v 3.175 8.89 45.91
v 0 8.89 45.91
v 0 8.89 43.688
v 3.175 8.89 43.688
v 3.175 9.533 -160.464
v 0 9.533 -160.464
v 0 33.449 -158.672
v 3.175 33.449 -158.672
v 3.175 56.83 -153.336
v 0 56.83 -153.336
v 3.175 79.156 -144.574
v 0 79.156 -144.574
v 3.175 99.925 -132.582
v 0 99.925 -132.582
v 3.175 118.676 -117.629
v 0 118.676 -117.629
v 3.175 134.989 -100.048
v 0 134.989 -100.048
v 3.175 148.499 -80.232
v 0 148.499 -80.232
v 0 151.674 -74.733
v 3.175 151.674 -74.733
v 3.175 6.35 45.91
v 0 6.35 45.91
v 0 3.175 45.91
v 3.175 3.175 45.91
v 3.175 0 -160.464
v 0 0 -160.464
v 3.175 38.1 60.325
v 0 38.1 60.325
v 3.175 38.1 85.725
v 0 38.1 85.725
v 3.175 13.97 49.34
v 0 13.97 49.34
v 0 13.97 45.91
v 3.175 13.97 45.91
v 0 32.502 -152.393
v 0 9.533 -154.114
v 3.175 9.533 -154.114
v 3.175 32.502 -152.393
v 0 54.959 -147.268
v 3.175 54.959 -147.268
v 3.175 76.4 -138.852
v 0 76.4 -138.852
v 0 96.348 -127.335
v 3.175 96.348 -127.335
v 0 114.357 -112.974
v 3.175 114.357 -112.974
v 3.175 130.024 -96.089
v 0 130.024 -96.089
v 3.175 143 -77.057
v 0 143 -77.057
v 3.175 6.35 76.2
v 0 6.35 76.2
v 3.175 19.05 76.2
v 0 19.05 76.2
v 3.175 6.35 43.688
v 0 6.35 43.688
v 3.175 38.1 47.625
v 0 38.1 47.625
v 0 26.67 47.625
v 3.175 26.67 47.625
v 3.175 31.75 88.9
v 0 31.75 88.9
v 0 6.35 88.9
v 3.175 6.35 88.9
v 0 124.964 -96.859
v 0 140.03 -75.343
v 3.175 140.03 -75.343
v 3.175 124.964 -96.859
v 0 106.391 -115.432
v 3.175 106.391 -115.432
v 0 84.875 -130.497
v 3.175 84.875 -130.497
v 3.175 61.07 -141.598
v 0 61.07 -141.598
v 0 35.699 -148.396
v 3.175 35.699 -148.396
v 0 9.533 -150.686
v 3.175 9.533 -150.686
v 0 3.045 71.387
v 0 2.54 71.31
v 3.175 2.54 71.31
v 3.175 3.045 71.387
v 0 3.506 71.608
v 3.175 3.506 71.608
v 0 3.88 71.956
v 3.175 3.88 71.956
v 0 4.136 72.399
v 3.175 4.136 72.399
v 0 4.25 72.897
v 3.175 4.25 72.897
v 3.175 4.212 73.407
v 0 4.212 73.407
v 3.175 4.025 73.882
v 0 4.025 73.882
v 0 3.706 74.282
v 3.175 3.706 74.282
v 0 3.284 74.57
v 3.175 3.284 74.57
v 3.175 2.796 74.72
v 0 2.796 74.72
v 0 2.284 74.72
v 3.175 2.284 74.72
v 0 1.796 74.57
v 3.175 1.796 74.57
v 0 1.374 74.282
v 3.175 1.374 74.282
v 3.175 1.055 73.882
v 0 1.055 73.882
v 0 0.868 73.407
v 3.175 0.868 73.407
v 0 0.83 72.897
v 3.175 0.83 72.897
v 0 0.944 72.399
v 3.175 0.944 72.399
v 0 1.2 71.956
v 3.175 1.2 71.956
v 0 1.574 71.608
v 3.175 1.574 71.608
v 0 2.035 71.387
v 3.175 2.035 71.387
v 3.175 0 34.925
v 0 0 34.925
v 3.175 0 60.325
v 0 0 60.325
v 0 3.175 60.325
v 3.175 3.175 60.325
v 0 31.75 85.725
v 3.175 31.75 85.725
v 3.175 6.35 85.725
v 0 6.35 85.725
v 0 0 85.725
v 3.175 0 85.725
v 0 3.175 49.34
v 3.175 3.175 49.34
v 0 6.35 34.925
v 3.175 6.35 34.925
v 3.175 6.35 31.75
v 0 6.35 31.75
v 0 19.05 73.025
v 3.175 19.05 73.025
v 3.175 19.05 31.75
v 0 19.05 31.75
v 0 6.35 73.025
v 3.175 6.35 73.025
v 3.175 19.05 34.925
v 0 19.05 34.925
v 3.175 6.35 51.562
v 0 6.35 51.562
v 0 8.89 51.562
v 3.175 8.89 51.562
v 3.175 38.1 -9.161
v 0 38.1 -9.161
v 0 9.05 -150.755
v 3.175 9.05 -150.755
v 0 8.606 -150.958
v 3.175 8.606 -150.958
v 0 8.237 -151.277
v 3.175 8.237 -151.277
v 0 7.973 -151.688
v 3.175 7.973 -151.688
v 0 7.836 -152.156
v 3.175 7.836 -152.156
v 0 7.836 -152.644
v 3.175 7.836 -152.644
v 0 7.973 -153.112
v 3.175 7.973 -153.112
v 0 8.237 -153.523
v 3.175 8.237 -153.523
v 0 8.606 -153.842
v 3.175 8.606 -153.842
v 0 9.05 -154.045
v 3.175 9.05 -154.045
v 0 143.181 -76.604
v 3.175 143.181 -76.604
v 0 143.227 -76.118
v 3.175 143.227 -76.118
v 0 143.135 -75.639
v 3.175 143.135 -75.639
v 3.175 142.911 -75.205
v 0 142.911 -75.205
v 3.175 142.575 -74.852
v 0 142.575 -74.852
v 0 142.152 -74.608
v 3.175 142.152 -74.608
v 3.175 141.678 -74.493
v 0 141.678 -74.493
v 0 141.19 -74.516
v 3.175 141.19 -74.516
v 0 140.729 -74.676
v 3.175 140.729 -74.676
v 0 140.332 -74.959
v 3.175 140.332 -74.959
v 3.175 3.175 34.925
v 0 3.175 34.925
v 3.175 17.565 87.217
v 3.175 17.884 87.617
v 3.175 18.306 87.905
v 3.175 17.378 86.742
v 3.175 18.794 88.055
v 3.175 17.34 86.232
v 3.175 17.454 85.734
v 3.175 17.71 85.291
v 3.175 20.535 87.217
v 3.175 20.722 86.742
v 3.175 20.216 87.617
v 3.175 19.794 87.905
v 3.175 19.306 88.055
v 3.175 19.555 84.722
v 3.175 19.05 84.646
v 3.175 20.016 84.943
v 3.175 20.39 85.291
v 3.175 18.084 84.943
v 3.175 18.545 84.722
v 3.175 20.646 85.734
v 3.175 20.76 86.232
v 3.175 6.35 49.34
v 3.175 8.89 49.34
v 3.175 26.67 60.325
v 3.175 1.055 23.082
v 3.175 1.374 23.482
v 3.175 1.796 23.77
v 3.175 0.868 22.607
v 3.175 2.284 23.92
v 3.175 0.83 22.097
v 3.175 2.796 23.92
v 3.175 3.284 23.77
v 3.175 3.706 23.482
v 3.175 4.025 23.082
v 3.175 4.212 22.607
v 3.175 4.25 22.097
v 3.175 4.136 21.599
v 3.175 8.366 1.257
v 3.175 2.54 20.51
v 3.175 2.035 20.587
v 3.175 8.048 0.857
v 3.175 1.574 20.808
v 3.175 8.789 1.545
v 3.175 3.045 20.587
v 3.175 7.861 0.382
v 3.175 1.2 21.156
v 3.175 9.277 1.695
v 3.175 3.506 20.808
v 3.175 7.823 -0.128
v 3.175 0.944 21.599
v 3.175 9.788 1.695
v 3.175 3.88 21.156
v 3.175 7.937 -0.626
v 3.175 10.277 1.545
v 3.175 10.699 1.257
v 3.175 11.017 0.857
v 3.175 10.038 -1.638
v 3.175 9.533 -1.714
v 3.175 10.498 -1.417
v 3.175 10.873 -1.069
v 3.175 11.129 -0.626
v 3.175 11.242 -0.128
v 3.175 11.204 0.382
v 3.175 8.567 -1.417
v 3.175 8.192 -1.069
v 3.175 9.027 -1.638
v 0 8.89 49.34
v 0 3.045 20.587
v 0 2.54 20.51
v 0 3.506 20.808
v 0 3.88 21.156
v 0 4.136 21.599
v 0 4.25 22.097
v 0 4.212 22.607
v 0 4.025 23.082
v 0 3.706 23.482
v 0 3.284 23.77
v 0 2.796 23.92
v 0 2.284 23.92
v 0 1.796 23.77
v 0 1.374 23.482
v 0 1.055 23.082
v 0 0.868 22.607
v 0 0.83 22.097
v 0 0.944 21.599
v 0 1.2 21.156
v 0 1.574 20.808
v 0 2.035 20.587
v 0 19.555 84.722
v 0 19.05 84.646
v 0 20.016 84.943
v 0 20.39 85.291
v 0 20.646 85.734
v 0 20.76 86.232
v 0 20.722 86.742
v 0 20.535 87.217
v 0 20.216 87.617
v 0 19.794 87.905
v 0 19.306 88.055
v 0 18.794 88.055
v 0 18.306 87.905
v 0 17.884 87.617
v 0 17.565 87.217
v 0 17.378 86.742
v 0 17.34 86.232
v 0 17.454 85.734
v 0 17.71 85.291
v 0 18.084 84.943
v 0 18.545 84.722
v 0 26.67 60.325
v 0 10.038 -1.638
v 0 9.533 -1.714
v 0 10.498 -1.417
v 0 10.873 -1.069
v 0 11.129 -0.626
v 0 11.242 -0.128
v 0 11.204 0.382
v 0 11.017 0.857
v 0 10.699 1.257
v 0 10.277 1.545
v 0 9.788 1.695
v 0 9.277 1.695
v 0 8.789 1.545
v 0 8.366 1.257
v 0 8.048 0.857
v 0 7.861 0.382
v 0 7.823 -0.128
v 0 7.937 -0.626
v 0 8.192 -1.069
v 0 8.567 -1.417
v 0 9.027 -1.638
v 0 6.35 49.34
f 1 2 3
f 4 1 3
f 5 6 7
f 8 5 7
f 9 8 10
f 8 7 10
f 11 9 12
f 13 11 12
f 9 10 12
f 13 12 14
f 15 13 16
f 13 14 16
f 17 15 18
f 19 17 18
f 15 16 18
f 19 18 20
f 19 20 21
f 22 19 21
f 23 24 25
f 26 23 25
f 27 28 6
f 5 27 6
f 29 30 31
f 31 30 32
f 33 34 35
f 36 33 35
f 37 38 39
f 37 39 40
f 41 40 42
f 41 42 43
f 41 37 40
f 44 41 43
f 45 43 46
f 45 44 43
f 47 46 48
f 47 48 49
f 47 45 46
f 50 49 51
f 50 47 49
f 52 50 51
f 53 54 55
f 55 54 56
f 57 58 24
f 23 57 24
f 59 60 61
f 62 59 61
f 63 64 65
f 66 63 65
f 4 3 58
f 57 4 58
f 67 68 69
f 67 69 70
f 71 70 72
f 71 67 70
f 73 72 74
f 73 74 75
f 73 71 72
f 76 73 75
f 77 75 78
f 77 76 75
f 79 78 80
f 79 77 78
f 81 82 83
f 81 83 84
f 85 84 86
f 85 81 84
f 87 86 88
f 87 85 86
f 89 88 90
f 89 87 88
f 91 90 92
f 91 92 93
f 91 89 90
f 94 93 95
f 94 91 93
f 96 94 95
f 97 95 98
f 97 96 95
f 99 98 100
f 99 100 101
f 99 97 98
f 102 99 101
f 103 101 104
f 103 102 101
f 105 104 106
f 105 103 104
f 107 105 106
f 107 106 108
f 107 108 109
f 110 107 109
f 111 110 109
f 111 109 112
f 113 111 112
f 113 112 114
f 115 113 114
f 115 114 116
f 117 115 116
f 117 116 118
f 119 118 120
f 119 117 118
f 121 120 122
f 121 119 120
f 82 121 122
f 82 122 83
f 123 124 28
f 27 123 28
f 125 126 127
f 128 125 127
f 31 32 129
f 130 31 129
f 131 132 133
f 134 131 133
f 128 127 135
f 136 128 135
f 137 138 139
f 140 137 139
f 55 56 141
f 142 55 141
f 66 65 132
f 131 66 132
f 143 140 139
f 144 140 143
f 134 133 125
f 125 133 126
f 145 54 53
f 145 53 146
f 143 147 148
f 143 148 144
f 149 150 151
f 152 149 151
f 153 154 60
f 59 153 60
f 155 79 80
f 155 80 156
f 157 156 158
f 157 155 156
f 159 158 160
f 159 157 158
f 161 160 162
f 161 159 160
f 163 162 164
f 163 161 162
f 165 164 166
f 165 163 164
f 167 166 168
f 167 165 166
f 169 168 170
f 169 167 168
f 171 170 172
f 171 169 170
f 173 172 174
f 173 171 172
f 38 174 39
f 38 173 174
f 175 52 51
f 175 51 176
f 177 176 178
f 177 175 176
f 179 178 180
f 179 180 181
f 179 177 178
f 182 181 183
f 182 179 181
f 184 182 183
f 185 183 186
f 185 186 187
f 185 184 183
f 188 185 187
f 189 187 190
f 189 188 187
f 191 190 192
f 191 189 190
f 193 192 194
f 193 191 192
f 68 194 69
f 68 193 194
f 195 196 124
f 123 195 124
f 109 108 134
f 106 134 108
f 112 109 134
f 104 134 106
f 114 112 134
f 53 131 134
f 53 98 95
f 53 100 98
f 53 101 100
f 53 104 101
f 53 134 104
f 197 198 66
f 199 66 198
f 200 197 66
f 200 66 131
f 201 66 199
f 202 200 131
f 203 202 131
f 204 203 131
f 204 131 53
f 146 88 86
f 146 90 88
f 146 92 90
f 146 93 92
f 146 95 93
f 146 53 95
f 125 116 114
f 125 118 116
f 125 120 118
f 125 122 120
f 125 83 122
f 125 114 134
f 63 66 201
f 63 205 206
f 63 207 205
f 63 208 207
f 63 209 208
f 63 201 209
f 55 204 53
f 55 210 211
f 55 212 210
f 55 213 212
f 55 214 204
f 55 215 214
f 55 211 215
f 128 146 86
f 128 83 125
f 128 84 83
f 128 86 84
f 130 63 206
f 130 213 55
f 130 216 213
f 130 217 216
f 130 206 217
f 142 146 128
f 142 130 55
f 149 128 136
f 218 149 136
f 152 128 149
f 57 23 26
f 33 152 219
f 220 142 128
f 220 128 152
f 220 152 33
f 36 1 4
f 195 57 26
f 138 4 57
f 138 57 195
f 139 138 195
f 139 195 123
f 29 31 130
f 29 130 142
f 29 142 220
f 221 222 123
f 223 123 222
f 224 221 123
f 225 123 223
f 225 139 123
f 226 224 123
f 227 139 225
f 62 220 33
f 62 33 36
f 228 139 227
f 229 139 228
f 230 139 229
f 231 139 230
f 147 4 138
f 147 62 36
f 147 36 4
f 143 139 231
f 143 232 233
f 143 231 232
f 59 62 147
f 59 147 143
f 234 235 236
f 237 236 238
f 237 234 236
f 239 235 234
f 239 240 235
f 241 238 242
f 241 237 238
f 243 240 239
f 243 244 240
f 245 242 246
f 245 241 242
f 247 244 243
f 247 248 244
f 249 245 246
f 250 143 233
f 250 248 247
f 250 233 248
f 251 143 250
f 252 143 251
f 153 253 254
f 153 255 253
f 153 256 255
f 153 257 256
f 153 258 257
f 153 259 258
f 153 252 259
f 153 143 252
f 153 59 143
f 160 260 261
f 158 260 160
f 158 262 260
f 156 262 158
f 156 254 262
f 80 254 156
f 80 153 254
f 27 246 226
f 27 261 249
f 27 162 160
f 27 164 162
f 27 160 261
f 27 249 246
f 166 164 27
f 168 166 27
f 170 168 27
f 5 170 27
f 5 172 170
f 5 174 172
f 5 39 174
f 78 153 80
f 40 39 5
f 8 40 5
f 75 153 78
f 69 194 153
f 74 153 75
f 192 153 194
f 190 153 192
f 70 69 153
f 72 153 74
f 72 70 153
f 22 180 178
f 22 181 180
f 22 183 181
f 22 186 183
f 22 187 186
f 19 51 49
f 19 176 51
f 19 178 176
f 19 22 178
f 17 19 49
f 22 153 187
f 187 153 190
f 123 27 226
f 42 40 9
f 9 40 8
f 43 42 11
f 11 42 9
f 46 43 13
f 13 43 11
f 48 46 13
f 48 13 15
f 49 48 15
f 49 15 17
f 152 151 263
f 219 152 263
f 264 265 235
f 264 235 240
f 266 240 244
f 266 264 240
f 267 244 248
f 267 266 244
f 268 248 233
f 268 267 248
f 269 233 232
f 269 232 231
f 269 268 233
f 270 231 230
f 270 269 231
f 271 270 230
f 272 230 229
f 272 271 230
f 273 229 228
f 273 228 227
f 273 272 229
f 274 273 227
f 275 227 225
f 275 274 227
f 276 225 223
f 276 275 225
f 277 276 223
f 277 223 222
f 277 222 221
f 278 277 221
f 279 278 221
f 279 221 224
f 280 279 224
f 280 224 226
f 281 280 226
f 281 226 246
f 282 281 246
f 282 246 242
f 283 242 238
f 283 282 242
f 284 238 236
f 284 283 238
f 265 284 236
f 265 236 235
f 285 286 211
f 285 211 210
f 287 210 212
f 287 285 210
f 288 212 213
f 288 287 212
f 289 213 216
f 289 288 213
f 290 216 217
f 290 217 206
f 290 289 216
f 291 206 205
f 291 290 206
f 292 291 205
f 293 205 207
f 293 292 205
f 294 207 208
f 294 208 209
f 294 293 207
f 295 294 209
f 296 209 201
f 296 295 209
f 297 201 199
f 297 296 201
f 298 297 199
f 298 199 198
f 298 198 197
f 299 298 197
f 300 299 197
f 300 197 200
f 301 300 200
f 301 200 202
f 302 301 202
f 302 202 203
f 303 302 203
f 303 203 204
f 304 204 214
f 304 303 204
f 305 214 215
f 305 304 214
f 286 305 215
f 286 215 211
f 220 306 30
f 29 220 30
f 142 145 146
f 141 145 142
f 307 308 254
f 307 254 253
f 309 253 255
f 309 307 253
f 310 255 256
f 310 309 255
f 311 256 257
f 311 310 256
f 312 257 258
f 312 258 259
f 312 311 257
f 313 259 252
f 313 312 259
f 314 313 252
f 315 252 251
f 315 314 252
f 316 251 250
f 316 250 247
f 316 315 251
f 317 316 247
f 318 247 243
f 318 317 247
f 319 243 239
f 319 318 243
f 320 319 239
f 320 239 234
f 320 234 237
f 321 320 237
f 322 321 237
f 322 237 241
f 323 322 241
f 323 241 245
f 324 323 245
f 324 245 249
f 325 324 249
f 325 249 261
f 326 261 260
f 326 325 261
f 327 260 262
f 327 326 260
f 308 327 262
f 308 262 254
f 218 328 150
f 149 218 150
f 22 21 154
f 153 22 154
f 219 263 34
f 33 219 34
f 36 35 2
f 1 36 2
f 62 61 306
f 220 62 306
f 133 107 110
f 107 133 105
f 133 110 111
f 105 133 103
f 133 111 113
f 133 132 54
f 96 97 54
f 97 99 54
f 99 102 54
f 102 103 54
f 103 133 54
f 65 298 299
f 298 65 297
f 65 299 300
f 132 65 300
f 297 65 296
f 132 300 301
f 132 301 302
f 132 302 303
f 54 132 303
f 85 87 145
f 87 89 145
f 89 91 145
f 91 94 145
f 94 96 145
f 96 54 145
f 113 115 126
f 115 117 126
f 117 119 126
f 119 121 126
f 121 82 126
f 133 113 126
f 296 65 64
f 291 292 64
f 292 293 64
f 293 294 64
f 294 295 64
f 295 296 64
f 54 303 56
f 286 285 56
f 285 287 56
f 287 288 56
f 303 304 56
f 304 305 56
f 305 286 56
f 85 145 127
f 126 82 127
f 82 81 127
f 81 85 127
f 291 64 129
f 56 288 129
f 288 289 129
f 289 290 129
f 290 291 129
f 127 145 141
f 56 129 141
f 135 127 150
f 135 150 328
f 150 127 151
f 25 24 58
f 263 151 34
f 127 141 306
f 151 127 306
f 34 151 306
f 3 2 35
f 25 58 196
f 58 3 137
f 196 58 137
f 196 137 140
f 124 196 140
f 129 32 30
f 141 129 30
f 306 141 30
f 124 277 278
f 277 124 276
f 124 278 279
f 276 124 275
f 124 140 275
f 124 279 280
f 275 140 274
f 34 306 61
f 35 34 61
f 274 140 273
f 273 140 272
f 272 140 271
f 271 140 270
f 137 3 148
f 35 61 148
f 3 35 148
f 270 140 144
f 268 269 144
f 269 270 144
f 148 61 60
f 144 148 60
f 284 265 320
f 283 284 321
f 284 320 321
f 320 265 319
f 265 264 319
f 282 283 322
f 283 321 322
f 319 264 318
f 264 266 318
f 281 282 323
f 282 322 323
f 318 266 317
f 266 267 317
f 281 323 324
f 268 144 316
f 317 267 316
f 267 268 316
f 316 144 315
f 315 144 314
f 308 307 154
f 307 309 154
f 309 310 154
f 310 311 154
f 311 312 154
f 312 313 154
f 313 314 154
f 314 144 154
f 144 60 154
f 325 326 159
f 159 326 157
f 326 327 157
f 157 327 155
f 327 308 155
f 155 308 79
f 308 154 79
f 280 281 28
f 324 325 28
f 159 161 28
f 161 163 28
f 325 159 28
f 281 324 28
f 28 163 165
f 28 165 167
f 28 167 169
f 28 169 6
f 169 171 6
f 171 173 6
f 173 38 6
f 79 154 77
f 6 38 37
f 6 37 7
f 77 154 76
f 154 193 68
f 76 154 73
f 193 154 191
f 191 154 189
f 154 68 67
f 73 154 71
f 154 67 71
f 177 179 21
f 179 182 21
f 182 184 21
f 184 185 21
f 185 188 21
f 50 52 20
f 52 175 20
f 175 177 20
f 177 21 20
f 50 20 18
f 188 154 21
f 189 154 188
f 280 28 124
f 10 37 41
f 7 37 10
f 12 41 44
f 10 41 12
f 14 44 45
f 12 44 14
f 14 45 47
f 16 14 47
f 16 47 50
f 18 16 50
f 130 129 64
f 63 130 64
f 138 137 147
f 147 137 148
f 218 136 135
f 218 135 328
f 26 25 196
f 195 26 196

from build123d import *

# Parameters (mm, degrees)
SKETCH1_R           = 1.7145
SKETCH1_W           = 3.175
SKETCH1_H           = 12.7
BOSS_EXTRUDE2_DEPTH = 3.175


with BuildPart() as part:
    # Sketch1 → Boss-Extrude2 (new body)
    with BuildSketch(Plane(origin=(0, 0, 0), x_dir=(0, 0, -1), z_dir=(1, 0, 0))):
        with BuildLine():
            Line((0, 0), (160.4645, 0))
            Line((160.4645, 0), (160.4645, 9.53262))
            ThreePointArc((160.4645, 9.53262), (138.966333406, 89.76487), (80.23225, 148.498953406))
            Line((80.23225, 148.498953406), (74.732988686, 151.673953406))
            Line((74.732988686, 151.673953406), (9.161036114, 38.1))
            Line((9.161036114, 38.1), (-47.625, 38.1))
            Line((-47.625, 38.1), (-47.625, 26.67))
            Line((-47.625, 26.67), (-60.325, 26.67))
            Line((-60.325, 26.67), (-60.325, 38.1))
            Line((-60.325, 38.1), (-85.725, 38.1))
            Line((-85.725, 38.1), (-85.725, 31.75))
            Line((-85.725, 31.75), (-88.9, 31.75))
            Line((-88.9, 31.75), (-88.9, 6.35))
            Line((-88.9, 6.35), (-85.725, 6.35))
            Line((-85.725, 6.35), (-85.725, 0))
            Line((-85.725, 0), (-60.325, 0))
            Line((-60.325, 0), (-60.325, 3.175))
            Line((-60.325, 3.175), (-49.3395, 3.175))
            Line((-49.3395, 3.175), (-49.3395, 6.35))
            Line((-49.3395, 6.35), (-51.562, 6.35))
            Line((-51.562, 6.35), (-51.562, 8.89))
            Line((-51.562, 8.89), (-49.3395, 8.89))
            Line((-49.3395, 8.89), (-49.3395, 13.97))
            Line((-49.3395, 13.97), (-45.9105, 13.97))
            Line((-45.9105, 13.97), (-45.9105, 8.89))
            Line((-45.9105, 8.89), (-43.688, 8.89))
            Line((-43.688, 8.89), (-43.688, 6.35))
            Line((-43.688, 6.35), (-45.9105, 6.35))
            Line((-45.9105, 6.35), (-45.9105, 3.175))
            Line((-45.9105, 3.175), (-34.925, 3.175))
            Line((-34.925, 3.175), (-34.925, 0))
            Line((-34.925, 0), (0, 0))
        make_face()
        with Locations((-86.36, 19.05)):
            Circle(SKETCH1_R, mode=Mode.SUBTRACT)
        with Locations((0, 9.53262)):
            Circle(SKETCH1_R, mode=Mode.SUBTRACT)
        with Locations((-73.025, 2.54)):
            Circle(SKETCH1_R, mode=Mode.SUBTRACT)
        with Locations((-22.225, 2.54)):
            Circle(SKETCH1_R, mode=Mode.SUBTRACT)
        with Locations((-74.6125, 12.7)):
            Rectangle(SKETCH1_W, SKETCH1_H, mode=Mode.SUBTRACT)
        with Locations((-33.3375, 12.7)):
            Rectangle(SKETCH1_W, SKETCH1_H, mode=Mode.SUBTRACT)
        with BuildLine():
            ThreePointArc((154.1145, 9.53262), (133.467072092, 86.58987), (77.05725, 142.999692092))
            ThreePointArc((77.05725, 142.999692092), (74.715199445, 142.372141537), (75.34275, 140.030090982))
            ThreePointArc((75.34275, 140.030090982), (130.497470982, 84.87537), (150.6855, 9.53262))
            ThreePointArc((150.6855, 9.53262), (152.4, 7.81812), (154.1145, 9.53262))
        make_face(mode=Mode.SUBTRACT)
    extrude(amount=BOSS_EXTRUDE2_DEPTH)


solid = part.part
